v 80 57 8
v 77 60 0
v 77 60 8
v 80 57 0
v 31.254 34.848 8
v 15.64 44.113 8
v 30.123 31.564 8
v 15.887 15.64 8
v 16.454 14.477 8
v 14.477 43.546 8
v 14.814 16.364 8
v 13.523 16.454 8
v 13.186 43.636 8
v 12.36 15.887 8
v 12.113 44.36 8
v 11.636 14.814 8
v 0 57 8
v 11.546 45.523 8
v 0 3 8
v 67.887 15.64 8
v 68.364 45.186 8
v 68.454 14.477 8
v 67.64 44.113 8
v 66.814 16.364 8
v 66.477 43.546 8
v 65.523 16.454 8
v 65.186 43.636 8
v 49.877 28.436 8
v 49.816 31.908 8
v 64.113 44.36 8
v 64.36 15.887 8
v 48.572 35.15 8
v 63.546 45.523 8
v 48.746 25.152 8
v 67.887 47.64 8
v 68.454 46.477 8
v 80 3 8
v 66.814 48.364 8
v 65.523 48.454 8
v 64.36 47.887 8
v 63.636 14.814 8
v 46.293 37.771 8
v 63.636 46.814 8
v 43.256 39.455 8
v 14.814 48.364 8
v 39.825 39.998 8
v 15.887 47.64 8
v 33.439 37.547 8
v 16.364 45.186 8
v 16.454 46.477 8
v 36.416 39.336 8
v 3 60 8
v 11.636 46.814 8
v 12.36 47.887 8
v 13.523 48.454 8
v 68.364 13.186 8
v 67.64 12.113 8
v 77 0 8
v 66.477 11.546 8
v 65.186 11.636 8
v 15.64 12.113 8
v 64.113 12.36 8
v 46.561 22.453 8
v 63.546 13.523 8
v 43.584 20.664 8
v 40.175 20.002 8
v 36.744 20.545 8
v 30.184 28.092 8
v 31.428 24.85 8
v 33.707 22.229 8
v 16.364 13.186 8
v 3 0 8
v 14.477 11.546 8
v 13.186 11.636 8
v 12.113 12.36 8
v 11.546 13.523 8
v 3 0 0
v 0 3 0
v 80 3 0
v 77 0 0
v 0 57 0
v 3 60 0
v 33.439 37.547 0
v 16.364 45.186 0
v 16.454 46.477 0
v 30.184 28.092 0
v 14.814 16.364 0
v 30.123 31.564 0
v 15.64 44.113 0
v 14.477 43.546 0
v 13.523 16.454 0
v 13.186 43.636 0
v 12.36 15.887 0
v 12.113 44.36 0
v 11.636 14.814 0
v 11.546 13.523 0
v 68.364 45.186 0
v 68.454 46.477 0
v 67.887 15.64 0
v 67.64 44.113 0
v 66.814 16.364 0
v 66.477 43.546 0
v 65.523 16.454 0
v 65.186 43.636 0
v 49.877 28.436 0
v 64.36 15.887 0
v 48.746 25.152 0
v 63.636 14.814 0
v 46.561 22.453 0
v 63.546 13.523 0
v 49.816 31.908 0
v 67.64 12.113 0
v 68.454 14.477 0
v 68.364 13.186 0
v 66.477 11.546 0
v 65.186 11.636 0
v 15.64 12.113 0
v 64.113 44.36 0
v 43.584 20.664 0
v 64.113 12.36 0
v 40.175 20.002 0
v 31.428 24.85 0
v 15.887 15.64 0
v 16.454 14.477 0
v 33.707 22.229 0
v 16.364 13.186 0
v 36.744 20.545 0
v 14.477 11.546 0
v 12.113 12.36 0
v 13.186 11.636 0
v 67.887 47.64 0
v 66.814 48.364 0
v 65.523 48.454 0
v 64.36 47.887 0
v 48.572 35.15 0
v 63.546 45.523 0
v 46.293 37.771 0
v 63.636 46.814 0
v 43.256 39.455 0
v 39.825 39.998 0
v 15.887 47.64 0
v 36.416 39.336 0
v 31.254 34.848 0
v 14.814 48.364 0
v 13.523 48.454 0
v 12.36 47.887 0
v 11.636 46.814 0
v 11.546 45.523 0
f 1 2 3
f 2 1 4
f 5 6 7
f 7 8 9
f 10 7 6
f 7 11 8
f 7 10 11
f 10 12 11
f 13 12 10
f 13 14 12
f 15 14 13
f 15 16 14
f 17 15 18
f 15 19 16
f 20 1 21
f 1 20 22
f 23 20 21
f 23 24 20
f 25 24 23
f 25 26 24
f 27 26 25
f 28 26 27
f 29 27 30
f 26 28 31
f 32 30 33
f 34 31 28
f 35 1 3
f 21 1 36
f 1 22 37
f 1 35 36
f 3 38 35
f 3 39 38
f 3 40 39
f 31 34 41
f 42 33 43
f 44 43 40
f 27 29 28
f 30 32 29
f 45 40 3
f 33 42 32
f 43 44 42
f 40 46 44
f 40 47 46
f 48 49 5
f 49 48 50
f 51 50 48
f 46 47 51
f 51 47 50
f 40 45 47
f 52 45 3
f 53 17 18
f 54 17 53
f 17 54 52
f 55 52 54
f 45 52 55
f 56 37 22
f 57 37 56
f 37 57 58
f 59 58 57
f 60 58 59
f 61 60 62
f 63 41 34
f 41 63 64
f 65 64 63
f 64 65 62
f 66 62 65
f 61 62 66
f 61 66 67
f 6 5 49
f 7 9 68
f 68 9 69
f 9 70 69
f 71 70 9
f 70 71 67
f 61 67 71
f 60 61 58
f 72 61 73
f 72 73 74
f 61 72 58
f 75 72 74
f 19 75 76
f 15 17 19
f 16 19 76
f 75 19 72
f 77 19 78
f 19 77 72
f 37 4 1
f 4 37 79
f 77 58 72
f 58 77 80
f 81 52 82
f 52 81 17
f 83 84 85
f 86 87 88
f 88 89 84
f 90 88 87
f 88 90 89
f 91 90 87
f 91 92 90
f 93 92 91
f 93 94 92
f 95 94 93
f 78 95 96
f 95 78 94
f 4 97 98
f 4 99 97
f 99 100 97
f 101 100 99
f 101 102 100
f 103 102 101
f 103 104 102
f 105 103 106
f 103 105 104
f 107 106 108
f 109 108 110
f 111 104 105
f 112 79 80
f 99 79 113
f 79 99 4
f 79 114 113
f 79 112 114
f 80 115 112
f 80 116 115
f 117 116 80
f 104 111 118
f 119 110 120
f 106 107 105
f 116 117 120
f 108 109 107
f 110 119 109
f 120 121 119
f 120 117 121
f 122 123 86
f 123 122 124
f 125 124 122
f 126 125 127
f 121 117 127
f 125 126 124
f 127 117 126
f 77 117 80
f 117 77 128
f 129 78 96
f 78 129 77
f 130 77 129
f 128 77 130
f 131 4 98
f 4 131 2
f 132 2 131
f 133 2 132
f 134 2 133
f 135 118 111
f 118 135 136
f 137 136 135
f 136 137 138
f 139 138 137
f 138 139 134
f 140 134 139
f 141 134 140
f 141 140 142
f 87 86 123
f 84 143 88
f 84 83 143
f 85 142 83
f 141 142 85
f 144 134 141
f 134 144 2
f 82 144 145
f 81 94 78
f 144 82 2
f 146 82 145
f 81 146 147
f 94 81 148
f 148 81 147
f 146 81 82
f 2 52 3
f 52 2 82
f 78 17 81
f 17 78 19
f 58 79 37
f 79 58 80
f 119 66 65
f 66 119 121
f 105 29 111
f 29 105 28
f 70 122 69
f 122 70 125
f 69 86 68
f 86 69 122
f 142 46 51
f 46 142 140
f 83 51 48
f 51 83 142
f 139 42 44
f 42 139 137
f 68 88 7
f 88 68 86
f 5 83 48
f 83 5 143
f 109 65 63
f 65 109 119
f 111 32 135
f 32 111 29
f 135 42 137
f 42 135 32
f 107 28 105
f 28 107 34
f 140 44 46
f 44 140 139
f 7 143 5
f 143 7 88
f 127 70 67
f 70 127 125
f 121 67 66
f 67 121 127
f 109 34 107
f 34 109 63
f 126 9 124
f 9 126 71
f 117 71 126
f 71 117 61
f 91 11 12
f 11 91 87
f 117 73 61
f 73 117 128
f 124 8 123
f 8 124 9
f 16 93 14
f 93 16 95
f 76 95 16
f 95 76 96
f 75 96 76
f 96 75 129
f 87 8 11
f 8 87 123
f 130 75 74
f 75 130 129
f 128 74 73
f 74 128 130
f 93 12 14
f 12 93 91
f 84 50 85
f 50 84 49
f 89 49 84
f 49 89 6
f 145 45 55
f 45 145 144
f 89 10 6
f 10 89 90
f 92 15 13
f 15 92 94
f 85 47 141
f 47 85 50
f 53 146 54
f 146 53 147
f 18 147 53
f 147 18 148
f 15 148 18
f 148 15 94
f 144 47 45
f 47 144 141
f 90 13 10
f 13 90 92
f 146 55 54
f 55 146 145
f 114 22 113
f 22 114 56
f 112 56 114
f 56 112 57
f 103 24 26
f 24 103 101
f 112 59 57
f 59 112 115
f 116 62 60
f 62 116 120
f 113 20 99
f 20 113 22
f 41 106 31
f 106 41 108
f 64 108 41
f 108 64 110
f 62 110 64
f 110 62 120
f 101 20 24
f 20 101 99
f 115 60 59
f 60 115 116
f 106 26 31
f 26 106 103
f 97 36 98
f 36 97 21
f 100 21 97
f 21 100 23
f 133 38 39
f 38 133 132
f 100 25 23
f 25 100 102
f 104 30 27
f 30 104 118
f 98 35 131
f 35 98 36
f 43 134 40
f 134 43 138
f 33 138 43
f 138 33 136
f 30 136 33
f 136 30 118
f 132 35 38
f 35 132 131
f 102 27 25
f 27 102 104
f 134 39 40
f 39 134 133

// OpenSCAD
$fn = 32;

// ----------------------------------------------------------------------
// Spacer plate: rect 80 x 60
// ----------------------------------------------------------------------

// --- parameters (mm) ---
bore_r = 10;              // centre bore radius
bolt_r = 2.5;             // bolt hole radius
plate_t = 8;              // plate thickness, Z (extrusion height)
plate_l = 80;             // plate length, X
plate_w = 60;             // plate width, Y
inset = 14;               // corner hole inset

profile = [[3, 0], [77, 0], [80, 3], [80, 57], [77, 60], [3, 60], [0, 57], [0, 3]];  // primary outline, 8 points, counter clockwise
void_1 = [[49.816, 31.908], [48.572, 35.15], [46.293, 37.771], [43.256, 39.455], [39.825, 39.998], [36.416, 39.336], [33.439, 37.547], [31.254, 34.848], [30.123, 31.564], [30.184, 28.092], [31.428, 24.85], [33.707, 22.229], [36.744, 20.545], [40.175, 20.002], [43.584, 20.664], [46.561, 22.453], [48.746, 25.152], [49.877, 28.436]];  // centre bore, 18 points
void_2 = [[16.454, 14.477], [15.887, 15.64], [14.814, 16.364], [13.523, 16.454], [12.36, 15.887], [11.636, 14.814], [11.546, 13.523], [12.113, 12.36], [13.186, 11.636], [14.477, 11.546], [15.64, 12.113], [16.364, 13.186]];  // corner hole, 12 points
void_3 = [[16.454, 46.477], [15.887, 47.64], [14.814, 48.364], [13.523, 48.454], [12.36, 47.887], [11.636, 46.814], [11.546, 45.523], [12.113, 44.36], [13.186, 43.636], [14.477, 43.546], [15.64, 44.113], [16.364, 45.186]];  // corner hole, 12 points
void_4 = [[68.454, 14.477], [67.887, 15.64], [66.814, 16.364], [65.523, 16.454], [64.36, 15.887], [63.636, 14.814], [63.546, 13.523], [64.113, 12.36], [65.186, 11.636], [66.477, 11.546], [67.64, 12.113], [68.364, 13.186]];  // corner hole, 12 points
void_5 = [[68.454, 46.477], [67.887, 47.64], [66.814, 48.364], [65.523, 48.454], [64.36, 47.887], [63.636, 46.814], [63.546, 45.523], [64.113, 44.36], [65.186, 43.636], [66.477, 43.546], [67.64, 44.113], [68.364, 45.186]];  // corner hole, 12 points

// --- the one profile operation ---
difference() {
  linear_extrude(height = plate_t) polygon(points = profile);
  translate([0, 0, -1])
    linear_extrude(height = plate_t + 2) polygon(points = void_1);
  translate([0, 0, -1])
    linear_extrude(height = plate_t + 2) polygon(points = void_2);
  translate([0, 0, -1])
    linear_extrude(height = plate_t + 2) polygon(points = void_3);
  translate([0, 0, -1])
    linear_extrude(height = plate_t + 2) polygon(points = void_4);
  translate([0, 0, -1])
    linear_extrude(height = plate_t + 2) polygon(points = void_5);
}
